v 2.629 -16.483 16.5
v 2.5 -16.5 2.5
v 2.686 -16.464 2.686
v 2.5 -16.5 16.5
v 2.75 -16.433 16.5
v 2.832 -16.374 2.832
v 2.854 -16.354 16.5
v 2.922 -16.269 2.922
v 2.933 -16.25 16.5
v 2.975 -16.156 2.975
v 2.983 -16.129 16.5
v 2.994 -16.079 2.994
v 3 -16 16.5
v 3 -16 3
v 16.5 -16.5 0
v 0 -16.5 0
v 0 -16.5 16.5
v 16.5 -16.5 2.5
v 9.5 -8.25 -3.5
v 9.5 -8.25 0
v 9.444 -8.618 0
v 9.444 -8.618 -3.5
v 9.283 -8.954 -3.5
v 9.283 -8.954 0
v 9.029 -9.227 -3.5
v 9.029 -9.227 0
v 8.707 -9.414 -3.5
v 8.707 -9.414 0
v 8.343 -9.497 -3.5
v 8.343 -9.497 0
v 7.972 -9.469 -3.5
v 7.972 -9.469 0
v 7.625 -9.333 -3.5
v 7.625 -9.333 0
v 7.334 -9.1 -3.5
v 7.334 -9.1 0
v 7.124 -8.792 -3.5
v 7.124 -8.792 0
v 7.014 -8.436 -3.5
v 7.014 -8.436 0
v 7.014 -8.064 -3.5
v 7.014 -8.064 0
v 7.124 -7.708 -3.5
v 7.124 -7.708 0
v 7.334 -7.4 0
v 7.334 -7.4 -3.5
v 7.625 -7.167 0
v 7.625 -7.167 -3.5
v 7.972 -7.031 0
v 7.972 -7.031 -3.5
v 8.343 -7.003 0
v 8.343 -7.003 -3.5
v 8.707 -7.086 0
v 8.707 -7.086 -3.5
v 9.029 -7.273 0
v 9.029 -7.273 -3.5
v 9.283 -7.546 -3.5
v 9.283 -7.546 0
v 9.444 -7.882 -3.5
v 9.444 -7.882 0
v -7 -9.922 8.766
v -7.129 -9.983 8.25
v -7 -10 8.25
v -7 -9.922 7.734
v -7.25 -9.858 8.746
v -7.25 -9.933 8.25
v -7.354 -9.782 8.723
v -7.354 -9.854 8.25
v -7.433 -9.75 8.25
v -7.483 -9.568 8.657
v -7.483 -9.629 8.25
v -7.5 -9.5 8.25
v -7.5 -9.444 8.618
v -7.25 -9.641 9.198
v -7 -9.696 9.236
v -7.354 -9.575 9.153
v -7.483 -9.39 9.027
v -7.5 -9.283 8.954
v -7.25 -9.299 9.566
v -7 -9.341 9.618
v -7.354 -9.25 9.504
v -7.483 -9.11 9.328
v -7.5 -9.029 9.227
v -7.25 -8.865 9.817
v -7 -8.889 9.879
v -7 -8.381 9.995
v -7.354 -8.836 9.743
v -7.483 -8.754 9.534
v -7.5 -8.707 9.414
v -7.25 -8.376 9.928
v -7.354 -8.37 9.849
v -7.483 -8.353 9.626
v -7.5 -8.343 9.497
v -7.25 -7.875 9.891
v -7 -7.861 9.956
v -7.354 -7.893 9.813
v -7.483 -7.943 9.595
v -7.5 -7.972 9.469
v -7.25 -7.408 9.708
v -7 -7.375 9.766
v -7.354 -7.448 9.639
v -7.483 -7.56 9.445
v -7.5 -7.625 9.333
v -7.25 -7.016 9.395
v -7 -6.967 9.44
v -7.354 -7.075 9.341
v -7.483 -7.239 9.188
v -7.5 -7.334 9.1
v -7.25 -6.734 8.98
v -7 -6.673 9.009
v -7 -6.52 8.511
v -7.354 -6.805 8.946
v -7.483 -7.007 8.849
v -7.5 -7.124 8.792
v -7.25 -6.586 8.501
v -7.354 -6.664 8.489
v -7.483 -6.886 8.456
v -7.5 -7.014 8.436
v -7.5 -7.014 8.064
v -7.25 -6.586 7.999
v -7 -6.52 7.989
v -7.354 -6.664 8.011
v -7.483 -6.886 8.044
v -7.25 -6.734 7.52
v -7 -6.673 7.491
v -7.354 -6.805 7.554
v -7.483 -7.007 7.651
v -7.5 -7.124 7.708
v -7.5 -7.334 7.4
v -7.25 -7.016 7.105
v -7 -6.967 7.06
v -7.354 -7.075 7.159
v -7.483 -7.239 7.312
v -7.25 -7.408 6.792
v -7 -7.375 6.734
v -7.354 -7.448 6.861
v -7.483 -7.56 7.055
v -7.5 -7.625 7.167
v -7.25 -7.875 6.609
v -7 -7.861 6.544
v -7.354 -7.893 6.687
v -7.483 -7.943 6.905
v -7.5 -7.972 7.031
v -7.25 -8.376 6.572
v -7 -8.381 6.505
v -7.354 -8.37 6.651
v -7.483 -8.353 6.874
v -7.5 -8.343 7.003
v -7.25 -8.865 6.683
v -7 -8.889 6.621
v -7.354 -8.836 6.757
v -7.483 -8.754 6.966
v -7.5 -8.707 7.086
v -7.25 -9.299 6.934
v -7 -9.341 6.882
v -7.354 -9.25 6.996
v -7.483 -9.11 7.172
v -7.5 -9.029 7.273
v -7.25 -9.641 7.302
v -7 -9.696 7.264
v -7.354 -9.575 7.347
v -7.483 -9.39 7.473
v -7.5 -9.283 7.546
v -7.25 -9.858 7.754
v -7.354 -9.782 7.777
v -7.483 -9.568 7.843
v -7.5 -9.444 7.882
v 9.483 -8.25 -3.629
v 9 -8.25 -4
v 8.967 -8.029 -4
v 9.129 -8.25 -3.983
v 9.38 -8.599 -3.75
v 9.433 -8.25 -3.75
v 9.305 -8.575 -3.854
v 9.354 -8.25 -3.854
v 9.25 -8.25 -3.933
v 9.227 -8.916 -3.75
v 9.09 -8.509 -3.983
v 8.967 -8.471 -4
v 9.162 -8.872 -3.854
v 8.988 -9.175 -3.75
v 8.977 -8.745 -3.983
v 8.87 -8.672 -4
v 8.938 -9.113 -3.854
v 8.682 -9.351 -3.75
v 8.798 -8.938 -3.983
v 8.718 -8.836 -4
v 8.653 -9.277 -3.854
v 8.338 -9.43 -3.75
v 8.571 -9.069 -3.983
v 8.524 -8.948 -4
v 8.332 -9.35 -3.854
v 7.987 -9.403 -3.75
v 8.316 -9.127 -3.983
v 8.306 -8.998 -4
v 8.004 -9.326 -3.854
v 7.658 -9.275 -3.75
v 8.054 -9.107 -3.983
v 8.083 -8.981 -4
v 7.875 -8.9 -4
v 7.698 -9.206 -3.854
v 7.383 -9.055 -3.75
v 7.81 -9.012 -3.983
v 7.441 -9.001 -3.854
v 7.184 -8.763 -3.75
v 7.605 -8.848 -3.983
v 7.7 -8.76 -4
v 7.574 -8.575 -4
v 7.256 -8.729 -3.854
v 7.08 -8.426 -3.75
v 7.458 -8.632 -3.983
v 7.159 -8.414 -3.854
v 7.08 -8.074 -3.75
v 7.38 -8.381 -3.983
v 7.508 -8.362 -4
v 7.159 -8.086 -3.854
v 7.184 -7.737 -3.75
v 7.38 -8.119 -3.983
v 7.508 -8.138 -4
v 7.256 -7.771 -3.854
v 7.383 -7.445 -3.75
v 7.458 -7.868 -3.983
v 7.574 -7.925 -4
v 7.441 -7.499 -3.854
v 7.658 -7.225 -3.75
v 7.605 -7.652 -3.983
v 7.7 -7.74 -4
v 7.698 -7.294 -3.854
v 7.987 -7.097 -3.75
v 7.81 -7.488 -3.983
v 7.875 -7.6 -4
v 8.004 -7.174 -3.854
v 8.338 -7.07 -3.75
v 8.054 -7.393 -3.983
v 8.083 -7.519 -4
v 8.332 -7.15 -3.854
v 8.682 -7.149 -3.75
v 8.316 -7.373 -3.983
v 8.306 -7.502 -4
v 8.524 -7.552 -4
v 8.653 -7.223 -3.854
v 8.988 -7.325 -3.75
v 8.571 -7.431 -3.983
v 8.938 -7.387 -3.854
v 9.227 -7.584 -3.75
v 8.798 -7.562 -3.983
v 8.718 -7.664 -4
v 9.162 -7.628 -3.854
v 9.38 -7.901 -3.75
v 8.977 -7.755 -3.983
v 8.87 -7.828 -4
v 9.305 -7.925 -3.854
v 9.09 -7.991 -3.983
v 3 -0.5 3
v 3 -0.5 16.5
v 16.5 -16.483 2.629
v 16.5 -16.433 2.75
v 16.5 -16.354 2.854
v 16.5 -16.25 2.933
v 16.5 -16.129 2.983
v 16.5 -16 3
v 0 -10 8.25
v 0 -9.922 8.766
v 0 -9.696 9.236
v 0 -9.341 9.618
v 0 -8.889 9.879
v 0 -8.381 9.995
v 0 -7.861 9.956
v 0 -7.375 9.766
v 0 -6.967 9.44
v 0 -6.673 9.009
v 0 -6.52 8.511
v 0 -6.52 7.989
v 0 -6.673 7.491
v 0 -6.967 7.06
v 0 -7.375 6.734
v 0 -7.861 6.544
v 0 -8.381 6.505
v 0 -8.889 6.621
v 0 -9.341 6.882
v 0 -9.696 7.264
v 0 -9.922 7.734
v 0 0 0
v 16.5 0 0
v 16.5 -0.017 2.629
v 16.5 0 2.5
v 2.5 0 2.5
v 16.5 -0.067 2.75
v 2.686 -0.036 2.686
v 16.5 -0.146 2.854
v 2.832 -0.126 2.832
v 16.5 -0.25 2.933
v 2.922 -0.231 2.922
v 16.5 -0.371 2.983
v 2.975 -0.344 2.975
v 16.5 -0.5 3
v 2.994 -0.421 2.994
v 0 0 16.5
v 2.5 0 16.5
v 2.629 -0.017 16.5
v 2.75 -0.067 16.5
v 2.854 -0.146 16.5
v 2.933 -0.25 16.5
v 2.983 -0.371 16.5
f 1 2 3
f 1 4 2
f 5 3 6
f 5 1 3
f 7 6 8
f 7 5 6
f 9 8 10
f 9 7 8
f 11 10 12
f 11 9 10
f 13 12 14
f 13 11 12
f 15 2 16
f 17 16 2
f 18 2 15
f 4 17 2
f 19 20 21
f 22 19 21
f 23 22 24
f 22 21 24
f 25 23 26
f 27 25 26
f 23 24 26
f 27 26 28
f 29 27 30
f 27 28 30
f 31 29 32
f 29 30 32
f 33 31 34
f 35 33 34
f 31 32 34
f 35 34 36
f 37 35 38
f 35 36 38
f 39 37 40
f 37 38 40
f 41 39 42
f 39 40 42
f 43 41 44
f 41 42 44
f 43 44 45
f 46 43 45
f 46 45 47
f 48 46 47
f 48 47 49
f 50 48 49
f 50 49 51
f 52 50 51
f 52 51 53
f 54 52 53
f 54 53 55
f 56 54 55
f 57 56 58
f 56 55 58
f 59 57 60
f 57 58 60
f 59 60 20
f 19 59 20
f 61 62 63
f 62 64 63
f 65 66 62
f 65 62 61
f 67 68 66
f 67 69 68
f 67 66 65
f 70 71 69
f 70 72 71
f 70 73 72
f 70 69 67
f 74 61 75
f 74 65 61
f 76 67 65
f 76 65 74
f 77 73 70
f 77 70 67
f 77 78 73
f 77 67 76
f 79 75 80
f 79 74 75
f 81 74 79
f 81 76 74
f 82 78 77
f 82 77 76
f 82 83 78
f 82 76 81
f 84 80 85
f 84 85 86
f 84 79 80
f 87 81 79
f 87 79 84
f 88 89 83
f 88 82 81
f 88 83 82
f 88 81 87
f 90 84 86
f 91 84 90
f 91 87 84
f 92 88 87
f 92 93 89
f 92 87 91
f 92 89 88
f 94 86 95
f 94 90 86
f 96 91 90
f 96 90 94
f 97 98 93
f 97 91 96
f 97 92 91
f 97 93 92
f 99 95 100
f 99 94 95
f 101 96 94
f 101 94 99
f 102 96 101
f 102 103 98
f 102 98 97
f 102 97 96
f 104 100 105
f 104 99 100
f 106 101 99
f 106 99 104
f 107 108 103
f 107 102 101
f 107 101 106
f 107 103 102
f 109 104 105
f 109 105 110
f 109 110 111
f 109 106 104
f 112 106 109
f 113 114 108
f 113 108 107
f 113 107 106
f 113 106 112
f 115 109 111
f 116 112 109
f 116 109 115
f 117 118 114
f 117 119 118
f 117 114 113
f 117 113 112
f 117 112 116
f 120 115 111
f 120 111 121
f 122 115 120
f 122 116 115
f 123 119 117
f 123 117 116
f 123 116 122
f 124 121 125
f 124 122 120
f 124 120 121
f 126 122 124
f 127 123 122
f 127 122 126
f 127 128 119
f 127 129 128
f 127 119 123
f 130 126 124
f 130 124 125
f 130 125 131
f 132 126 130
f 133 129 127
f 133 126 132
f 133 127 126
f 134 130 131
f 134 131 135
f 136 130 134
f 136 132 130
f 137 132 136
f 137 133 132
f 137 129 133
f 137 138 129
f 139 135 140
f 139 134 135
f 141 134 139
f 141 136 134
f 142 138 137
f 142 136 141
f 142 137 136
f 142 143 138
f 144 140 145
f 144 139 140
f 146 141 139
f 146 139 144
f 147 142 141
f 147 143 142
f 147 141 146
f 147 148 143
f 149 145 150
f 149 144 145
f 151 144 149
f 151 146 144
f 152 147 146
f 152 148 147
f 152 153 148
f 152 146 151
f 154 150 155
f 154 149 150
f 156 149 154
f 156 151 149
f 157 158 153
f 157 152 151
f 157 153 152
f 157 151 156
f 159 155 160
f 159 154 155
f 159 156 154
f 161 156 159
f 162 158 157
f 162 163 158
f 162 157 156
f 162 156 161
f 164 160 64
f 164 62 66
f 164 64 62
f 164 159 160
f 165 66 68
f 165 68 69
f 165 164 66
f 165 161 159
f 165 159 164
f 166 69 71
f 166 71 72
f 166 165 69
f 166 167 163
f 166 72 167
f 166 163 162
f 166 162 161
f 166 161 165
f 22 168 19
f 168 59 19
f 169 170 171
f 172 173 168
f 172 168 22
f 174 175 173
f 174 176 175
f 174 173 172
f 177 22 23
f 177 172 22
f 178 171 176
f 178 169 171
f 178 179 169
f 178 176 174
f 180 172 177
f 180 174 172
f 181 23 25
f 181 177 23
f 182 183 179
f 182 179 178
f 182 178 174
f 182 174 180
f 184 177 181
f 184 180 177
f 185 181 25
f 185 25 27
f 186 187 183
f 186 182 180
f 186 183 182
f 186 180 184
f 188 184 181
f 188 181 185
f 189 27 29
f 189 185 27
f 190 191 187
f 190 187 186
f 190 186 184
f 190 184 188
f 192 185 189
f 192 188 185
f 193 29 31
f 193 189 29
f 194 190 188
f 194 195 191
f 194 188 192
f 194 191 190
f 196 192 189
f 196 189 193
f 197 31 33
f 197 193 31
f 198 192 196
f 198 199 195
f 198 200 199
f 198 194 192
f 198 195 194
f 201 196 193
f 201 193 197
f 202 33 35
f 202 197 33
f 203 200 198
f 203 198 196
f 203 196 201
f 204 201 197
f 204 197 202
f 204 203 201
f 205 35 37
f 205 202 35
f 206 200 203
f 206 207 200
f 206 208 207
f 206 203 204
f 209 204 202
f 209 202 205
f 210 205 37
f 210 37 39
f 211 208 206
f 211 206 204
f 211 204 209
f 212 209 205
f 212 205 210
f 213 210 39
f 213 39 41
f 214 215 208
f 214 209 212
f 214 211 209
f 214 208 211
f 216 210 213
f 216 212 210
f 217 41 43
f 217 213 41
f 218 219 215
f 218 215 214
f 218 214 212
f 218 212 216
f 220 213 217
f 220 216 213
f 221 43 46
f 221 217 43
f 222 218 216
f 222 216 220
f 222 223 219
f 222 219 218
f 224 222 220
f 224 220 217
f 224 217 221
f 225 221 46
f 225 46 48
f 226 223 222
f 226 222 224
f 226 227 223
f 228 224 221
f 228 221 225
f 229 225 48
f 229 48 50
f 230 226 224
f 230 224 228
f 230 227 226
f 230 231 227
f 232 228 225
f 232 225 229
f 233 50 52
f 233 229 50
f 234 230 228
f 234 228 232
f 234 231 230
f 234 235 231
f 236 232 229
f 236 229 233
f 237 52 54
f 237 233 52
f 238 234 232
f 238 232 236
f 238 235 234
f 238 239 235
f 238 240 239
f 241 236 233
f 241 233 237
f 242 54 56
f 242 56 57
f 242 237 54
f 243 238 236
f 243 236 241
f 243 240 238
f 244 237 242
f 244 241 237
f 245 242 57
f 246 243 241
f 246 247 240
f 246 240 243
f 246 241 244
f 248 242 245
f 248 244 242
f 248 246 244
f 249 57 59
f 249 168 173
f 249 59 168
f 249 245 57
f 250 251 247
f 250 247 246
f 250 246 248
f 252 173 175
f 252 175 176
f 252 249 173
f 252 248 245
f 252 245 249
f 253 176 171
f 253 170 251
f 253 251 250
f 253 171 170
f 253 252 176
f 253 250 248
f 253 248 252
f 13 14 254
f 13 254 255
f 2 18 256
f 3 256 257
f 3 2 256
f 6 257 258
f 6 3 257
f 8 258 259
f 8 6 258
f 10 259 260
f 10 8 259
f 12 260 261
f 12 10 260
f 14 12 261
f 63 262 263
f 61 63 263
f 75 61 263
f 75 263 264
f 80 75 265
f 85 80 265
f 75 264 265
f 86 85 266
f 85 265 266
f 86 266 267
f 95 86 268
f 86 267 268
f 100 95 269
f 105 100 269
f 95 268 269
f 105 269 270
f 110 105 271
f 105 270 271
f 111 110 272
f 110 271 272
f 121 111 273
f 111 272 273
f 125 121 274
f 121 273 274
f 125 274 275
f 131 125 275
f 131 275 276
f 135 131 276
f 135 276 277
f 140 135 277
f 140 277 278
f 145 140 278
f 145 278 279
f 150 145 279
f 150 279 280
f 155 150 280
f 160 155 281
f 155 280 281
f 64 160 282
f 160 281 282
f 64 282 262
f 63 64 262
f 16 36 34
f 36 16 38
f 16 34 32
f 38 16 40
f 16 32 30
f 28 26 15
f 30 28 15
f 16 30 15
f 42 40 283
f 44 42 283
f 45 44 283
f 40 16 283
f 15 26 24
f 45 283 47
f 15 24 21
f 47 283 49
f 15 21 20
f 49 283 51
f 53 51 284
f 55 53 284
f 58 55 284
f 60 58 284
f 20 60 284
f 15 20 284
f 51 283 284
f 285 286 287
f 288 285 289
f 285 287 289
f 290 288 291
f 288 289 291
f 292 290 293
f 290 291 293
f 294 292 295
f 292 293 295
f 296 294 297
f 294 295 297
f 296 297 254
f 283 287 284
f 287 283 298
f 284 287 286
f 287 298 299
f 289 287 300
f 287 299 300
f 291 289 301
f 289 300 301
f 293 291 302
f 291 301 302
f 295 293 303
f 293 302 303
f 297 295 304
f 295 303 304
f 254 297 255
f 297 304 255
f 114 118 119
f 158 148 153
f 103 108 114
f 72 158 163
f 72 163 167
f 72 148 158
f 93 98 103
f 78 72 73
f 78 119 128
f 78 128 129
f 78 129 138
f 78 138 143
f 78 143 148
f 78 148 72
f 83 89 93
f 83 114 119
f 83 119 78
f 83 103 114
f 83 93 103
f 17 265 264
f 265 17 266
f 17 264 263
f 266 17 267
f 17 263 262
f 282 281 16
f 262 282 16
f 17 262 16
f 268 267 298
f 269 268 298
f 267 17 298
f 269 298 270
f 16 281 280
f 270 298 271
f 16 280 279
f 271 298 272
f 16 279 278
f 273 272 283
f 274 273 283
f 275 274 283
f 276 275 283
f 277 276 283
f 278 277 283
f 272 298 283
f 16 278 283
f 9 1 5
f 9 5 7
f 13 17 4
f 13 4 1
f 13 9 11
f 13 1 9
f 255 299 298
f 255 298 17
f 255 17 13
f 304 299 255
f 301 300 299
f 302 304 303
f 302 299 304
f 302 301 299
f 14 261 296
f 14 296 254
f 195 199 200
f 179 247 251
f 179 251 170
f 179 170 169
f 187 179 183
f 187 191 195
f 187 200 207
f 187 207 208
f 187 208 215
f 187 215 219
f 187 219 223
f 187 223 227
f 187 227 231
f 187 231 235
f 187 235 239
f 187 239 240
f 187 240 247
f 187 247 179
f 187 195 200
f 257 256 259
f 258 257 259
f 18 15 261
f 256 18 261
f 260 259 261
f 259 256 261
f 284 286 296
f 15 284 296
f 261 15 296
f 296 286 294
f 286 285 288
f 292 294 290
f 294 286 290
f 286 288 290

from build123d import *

# Parameters (mm, degrees)
F0_W     = 3
F0_H     = 13.5
F1_DEPTH = 16.5
F2_R     = 1.25
F3_DEPTH = 4
F4_R     = 1.75
F5_DEPTH = 7.5
F6_R     = 0.5
F7_R     = 0.5
F8_R     = 0.5


with BuildPart() as f1:
    # F0 (on Front) → F1 (new body)
    with BuildSketch(Plane.XZ):
        with Locations((1.5, 9.75)):
            Rectangle(F0_W, F0_H)
        Polygon((3, 3), (0, 3), (0, 0), (16.5, 0), (16.5, 3), align=None)
    extrude(amount=F1_DEPTH)

    # F2 (on face) → F3 (join)
    with BuildSketch(Plane(origin=(0, 0, 0), x_dir=(1, 0, 0), z_dir=(0, 0, -1))):
        with Locations((8.25, 8.25)):
            Circle(F2_R)
    extrude(amount=F3_DEPTH)

    # F4 (on face) → F5 (join)
    with BuildSketch(Plane(origin=(0, 0, 0), x_dir=(0, -1, 0), z_dir=(-1, 0, 0))):
        with Locations((8.25, 8.25)):
            Circle(F4_R)
    extrude(amount=F5_DEPTH)

    # F6
    f6_edges = [f1.edges().sort_by_distance(p)[0] for p in [
        (7, -8.25, -4),
    ]]
    fillet(f6_edges, radius=F6_R)

    # F7
    f7_edges = [f1.edges().sort_by_distance(p)[0] for p in [
        (-7.5, -6.5, 8.25),
    ]]
    fillet(f7_edges, radius=F7_R)

    # F8
    f8_edges = [f1.edges().sort_by_distance(p)[0] for p in [
        (3, 0, 9.75),
        (3, -16.5, 9.75),
        (9.75, -16.5, 3),
        (9.75, 0, 3),
    ]]
    fillet(f8_edges, radius=F8_R)


solid = f1.part
